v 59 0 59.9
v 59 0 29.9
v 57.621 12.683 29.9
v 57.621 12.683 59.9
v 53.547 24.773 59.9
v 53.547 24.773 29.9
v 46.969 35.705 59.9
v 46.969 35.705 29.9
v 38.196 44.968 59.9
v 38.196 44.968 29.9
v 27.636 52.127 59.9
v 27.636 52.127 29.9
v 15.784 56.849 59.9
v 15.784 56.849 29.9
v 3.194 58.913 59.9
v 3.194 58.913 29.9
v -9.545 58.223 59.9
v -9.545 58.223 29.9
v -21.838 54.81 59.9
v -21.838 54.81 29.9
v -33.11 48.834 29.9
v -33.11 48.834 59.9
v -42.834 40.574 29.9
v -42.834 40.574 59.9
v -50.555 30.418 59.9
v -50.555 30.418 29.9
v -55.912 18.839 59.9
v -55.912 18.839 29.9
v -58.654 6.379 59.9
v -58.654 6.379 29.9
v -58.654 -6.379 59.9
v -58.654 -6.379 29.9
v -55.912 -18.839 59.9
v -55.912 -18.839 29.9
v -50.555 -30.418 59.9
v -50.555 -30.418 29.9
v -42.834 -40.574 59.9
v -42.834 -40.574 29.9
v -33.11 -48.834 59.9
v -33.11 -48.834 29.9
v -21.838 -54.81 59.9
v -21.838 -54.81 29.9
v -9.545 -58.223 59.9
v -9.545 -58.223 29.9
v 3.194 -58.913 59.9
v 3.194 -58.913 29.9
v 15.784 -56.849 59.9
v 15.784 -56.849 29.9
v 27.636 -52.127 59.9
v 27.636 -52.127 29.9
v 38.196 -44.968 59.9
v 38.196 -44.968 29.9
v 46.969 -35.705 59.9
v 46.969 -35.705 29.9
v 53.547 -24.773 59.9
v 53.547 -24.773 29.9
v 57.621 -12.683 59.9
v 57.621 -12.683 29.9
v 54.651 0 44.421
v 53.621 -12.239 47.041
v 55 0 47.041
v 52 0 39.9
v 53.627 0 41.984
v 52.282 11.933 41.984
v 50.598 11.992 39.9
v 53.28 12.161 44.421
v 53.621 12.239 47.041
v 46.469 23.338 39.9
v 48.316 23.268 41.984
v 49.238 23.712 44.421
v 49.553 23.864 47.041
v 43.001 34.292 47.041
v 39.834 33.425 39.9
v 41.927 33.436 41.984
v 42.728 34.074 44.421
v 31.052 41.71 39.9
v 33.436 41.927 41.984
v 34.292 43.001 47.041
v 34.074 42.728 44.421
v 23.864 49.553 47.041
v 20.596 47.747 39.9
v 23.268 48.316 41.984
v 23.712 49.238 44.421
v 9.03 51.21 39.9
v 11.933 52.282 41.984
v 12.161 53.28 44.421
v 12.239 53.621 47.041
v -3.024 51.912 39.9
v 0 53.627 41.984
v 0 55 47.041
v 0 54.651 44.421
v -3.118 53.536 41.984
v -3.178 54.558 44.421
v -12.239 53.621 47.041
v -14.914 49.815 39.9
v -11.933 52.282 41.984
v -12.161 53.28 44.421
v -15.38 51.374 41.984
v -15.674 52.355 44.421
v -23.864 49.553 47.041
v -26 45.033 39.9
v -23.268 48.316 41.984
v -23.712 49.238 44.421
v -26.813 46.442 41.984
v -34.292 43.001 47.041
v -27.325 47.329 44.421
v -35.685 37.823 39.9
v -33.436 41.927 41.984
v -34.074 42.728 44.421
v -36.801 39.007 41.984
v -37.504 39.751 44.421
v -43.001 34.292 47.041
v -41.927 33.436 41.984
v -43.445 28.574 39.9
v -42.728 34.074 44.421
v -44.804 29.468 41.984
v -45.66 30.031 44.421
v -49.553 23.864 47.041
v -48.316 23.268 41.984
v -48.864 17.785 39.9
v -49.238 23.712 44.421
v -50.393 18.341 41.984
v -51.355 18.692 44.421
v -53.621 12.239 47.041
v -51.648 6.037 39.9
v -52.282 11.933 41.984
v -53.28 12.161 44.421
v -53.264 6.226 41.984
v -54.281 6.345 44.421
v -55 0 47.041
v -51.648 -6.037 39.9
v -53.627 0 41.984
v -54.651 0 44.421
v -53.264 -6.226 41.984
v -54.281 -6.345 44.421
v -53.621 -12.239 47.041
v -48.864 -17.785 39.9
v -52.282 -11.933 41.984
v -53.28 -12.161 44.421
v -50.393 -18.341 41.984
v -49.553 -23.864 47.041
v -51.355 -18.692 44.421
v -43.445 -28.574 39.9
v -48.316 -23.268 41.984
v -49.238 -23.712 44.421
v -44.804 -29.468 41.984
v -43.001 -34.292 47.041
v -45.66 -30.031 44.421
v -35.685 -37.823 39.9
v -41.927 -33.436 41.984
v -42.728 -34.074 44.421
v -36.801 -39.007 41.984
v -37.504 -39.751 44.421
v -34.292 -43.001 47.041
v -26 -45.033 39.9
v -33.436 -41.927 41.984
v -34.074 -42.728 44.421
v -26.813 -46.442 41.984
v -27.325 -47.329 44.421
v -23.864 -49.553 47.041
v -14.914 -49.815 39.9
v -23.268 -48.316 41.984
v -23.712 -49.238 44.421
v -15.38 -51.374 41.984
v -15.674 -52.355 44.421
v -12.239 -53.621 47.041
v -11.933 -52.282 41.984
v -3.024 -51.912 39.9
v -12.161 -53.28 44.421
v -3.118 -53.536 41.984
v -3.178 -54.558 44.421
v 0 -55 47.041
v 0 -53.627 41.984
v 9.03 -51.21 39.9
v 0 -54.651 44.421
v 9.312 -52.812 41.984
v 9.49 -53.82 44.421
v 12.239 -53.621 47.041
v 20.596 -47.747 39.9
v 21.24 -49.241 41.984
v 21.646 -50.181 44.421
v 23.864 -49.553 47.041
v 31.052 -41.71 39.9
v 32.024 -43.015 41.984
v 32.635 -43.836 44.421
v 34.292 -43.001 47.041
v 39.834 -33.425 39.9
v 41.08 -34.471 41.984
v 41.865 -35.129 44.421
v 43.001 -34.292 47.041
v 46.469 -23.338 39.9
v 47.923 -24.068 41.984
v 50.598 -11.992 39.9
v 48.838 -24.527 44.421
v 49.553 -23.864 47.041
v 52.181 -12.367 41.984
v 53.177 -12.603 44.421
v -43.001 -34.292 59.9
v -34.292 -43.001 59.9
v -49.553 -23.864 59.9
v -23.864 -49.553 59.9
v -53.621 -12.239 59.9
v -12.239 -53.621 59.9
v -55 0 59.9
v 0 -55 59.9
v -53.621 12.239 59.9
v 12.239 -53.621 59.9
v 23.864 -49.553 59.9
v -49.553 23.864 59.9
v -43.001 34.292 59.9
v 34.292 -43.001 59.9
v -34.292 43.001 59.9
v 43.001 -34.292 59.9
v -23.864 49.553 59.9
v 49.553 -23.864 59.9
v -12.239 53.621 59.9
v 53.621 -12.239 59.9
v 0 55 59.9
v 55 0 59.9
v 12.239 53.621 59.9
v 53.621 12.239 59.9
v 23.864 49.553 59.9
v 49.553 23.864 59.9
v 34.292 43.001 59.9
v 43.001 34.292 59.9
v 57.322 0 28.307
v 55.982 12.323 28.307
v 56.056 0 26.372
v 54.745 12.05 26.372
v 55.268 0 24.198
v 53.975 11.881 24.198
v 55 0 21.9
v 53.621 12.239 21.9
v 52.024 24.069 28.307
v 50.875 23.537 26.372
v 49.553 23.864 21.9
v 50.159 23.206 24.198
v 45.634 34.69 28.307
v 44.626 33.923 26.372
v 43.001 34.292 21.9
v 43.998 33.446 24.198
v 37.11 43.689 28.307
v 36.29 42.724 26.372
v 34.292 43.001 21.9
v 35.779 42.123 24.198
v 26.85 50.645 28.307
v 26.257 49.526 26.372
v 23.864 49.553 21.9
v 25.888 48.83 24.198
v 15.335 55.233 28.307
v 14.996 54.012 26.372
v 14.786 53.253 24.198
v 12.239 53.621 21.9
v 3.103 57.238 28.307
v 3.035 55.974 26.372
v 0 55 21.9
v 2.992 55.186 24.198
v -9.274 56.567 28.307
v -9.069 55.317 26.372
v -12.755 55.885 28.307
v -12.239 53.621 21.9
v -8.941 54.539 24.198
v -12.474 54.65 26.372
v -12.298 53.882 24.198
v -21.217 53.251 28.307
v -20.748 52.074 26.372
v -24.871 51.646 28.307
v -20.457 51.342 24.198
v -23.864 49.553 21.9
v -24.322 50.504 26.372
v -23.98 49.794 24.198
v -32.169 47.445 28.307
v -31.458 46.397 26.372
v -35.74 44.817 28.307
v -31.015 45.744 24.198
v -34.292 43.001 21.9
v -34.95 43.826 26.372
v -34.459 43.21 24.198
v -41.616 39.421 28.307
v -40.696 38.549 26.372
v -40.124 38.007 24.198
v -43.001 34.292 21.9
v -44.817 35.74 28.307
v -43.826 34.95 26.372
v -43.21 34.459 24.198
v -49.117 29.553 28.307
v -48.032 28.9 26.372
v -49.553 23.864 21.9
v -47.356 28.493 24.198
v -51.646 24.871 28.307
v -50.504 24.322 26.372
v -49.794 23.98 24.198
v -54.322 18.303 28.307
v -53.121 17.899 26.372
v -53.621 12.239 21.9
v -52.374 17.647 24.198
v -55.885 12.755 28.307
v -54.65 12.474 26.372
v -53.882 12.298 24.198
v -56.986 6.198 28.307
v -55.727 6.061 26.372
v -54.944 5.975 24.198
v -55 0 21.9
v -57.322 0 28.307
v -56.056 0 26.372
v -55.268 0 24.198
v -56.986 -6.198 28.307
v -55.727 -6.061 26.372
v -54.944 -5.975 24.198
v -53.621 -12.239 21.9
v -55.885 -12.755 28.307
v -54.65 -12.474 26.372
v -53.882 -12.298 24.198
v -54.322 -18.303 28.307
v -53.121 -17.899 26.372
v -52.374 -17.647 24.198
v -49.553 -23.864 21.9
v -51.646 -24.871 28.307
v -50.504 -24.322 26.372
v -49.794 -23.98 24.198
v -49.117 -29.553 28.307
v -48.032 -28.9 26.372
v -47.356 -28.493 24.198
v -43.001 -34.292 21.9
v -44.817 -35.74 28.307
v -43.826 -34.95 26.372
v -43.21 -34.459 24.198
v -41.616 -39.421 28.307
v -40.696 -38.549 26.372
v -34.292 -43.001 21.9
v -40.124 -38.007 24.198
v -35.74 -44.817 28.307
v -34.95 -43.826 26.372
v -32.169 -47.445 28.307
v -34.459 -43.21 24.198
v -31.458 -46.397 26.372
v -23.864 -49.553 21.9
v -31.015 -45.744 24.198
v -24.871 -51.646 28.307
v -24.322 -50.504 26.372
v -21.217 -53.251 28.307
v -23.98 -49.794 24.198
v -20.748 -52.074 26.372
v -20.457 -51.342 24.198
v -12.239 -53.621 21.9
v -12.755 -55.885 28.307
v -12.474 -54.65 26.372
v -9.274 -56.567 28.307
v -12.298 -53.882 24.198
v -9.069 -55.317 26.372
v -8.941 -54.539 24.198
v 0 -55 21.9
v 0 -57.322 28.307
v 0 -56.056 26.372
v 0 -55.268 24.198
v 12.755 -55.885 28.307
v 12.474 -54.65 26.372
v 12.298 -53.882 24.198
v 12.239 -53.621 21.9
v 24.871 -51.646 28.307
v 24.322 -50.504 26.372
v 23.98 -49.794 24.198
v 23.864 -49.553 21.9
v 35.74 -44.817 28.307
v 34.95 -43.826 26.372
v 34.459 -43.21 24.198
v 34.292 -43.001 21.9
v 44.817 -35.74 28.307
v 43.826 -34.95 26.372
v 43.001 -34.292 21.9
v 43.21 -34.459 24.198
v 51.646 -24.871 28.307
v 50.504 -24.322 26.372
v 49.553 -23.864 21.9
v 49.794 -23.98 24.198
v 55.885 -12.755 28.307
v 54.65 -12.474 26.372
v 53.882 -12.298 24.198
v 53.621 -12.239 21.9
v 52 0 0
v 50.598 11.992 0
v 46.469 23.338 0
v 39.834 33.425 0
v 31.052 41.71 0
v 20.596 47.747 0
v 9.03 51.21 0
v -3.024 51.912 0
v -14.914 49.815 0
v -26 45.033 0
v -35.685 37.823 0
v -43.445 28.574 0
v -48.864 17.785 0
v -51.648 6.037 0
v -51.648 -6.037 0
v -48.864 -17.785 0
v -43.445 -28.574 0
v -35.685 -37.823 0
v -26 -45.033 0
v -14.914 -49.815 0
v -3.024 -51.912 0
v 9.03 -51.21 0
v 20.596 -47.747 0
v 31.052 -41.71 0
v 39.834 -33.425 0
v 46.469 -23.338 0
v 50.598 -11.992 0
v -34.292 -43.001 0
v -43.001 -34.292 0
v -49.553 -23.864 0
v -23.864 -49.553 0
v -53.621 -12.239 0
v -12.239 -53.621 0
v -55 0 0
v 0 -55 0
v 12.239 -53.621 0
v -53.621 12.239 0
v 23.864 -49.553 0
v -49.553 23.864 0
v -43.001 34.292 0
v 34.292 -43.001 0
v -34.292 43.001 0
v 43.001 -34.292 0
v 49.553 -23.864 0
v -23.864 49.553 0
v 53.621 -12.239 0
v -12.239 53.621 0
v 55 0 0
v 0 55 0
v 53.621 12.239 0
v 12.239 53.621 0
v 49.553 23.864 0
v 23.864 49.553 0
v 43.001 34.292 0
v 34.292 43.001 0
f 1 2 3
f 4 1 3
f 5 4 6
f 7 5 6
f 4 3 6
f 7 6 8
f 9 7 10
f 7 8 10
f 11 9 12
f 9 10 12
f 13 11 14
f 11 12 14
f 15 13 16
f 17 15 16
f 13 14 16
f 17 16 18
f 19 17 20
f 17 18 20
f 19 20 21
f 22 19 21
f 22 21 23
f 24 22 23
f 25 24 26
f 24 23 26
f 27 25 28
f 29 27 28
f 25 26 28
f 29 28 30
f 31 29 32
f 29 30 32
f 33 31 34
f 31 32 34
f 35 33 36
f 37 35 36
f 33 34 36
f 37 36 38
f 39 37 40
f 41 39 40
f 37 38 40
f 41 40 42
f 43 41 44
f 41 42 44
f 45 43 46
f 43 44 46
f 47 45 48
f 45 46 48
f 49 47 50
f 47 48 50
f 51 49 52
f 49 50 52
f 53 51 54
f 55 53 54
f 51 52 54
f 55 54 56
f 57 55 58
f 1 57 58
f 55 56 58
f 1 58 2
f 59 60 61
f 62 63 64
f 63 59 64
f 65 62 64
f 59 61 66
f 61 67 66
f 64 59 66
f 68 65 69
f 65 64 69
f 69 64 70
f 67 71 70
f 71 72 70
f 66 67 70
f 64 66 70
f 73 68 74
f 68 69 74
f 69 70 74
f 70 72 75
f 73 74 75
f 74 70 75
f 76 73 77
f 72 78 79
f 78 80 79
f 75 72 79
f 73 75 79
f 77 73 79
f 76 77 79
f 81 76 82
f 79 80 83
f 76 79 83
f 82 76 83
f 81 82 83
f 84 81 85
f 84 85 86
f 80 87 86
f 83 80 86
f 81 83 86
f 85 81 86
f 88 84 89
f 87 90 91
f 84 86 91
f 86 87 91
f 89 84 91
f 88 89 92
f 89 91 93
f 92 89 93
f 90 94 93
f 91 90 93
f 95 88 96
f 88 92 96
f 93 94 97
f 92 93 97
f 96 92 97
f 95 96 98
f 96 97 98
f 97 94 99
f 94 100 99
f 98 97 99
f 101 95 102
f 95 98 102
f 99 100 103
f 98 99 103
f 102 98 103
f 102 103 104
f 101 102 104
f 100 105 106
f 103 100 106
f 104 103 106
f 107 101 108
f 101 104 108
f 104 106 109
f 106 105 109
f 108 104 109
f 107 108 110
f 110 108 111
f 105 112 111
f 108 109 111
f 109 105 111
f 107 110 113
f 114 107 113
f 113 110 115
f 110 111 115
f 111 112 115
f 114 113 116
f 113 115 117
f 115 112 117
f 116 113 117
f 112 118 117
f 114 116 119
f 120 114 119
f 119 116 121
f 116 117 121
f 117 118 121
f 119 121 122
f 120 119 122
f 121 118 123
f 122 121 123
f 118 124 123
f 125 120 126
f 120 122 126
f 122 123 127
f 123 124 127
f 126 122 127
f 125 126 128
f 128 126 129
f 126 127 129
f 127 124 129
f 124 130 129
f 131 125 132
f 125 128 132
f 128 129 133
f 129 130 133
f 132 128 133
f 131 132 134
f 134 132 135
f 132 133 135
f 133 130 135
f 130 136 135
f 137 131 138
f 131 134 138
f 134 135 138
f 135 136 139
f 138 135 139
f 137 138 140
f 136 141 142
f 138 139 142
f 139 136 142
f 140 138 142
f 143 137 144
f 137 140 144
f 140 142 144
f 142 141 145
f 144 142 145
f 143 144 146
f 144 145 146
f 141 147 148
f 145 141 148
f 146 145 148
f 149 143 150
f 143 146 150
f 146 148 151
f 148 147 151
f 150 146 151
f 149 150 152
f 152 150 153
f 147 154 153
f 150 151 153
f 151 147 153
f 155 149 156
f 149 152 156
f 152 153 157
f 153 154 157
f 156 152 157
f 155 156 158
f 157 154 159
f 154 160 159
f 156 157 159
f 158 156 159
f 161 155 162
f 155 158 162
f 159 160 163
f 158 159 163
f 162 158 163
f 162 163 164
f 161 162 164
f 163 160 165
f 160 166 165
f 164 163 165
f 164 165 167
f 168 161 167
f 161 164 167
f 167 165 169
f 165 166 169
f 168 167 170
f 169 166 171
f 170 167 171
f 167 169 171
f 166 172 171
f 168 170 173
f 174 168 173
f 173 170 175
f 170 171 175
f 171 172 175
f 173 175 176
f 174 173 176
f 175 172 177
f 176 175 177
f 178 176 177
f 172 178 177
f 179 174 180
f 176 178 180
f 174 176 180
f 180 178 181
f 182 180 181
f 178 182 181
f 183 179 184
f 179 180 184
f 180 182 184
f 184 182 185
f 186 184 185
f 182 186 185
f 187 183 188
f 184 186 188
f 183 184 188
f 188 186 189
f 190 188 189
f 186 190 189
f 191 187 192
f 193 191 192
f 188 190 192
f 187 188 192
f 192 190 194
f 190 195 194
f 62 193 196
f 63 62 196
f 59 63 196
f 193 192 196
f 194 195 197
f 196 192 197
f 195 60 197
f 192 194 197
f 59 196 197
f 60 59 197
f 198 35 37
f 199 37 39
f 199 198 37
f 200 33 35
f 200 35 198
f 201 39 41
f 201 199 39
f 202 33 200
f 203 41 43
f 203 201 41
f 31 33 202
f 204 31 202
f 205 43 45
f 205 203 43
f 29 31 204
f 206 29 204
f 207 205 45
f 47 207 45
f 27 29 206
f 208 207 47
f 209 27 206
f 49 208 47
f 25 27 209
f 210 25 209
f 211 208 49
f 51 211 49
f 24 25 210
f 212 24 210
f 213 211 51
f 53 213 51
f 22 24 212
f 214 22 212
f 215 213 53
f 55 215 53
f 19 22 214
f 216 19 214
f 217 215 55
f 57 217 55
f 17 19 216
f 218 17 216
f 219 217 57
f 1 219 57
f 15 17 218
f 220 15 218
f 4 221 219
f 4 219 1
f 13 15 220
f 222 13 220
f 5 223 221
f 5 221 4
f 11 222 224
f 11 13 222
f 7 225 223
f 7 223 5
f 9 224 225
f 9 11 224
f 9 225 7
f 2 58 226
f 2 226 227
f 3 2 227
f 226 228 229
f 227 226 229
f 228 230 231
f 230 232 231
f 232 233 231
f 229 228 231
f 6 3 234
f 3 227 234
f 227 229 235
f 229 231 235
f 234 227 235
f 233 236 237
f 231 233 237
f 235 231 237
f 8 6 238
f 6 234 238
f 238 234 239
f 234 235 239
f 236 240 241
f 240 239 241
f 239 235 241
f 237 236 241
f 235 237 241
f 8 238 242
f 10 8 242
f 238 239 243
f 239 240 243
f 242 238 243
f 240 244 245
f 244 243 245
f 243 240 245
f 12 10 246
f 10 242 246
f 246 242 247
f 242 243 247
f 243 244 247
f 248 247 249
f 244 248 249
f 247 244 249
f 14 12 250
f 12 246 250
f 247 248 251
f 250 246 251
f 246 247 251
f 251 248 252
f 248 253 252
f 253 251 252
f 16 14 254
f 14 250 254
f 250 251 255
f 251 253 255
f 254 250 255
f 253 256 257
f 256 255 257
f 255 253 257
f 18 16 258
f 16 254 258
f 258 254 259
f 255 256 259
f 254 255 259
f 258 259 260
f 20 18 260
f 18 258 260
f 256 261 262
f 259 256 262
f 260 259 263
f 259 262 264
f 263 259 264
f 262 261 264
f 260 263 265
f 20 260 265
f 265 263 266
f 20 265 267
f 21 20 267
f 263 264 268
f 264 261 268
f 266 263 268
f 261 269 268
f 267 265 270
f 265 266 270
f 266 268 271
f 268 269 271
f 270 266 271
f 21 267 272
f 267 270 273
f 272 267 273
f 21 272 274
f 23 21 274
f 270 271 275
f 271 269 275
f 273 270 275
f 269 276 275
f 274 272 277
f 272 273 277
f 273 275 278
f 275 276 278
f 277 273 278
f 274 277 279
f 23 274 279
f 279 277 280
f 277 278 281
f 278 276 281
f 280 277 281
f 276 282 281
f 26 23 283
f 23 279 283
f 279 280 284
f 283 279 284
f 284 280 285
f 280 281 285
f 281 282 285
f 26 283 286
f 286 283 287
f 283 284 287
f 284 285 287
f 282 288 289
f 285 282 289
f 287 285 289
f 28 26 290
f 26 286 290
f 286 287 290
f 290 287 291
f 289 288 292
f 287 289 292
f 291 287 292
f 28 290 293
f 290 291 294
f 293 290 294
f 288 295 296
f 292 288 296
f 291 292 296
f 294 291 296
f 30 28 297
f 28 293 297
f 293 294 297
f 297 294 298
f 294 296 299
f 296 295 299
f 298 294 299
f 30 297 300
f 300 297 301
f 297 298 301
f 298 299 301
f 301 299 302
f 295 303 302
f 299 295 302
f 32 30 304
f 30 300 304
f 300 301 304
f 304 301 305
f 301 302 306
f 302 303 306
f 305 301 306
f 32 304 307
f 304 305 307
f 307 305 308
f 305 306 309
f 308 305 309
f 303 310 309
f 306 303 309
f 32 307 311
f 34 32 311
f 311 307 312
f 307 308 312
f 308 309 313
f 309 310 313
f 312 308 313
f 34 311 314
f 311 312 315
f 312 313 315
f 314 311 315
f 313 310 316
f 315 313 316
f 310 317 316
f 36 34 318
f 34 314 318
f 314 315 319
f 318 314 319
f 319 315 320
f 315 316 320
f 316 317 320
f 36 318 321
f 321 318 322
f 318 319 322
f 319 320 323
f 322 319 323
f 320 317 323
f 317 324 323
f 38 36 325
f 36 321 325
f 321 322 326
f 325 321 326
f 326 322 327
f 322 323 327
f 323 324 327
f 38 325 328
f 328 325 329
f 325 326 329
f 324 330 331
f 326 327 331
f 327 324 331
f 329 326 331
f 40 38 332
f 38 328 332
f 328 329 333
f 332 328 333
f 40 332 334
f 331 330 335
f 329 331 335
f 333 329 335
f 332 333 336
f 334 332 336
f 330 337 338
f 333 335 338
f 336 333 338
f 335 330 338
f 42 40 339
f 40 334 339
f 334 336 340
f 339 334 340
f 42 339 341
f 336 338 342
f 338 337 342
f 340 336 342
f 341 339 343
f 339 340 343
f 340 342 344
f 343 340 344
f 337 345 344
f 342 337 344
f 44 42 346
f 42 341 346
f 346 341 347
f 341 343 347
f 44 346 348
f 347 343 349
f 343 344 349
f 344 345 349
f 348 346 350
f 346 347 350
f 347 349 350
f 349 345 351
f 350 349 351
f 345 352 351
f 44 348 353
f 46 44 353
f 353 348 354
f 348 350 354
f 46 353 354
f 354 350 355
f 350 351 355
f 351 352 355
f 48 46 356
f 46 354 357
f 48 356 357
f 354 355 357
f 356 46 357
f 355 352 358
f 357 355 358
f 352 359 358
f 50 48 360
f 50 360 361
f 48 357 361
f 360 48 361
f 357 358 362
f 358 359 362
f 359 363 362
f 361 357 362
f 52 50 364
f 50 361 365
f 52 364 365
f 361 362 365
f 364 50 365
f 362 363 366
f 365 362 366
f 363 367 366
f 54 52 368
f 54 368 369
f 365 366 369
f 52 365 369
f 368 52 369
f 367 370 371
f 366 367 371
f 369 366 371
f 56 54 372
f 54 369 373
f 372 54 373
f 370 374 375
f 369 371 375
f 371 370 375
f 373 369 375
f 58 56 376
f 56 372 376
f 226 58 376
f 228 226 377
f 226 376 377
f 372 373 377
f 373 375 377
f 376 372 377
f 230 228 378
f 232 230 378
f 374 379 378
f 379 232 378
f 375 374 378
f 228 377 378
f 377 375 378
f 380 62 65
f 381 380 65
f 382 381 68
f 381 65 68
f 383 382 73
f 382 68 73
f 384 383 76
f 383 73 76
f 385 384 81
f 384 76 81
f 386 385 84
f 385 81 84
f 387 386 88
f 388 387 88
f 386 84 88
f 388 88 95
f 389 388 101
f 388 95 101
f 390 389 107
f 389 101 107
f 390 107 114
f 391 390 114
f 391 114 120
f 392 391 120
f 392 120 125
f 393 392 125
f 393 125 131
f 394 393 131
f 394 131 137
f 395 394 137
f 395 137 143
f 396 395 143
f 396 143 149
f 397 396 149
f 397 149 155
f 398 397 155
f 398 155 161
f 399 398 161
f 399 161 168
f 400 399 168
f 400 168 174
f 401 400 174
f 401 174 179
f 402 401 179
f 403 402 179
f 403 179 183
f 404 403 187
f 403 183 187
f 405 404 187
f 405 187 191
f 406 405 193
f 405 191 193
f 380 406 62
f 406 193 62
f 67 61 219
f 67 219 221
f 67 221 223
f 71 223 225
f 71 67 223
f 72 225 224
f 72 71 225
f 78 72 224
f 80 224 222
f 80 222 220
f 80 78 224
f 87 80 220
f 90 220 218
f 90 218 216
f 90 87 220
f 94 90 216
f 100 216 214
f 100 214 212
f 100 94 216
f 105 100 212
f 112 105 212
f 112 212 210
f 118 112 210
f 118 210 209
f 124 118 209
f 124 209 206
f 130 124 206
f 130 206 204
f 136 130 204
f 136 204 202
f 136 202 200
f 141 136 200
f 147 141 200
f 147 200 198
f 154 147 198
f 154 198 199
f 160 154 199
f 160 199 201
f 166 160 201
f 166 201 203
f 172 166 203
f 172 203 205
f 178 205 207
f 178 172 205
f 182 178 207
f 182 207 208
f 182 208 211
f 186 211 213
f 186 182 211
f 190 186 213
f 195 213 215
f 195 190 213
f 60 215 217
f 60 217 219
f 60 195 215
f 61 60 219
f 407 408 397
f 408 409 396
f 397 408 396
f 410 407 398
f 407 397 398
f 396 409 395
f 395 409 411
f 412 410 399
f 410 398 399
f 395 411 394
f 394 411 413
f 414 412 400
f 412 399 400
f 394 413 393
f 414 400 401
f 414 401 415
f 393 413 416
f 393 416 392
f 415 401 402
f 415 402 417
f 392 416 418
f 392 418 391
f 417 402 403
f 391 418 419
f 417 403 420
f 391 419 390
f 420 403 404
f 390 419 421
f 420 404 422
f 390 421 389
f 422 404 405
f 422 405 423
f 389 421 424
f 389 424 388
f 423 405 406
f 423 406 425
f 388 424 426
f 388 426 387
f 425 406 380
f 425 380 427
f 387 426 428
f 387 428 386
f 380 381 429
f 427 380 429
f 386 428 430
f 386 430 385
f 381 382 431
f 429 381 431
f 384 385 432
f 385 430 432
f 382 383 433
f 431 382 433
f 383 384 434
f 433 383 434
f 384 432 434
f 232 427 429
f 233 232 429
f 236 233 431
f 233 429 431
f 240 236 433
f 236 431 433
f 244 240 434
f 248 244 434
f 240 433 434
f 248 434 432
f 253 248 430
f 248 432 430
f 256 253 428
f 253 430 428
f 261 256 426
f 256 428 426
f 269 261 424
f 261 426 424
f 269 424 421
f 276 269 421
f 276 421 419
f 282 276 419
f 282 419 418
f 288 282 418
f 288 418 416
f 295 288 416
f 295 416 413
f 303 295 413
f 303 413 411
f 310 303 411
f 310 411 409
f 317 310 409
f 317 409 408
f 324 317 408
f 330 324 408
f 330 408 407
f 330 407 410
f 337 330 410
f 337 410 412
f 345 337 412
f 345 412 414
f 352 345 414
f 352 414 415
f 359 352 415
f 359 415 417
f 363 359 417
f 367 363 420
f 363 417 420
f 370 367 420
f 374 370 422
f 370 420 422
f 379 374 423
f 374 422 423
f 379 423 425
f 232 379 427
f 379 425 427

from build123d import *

# Parameters (mm, degrees)
SKETCH1_R              = 55
SKETCH1_R_2            = 3
BOSS_EXTRUDE1_DEPTH    = 39.9
SKETCH2_R              = 52
CUT_EXTRUDE1_DEPTH     = 60
CUT_EXTRUDE2_START     = -39.9
CUT_EXTRUDE2_OUTLINE_R = 3
CUT_EXTRUDE2_DEPTH     = 39.9
EXTRUDE_THIN1_START    = -10
SKETCH4_R              = 59
SKETCH4_R_2            = 55
EXTRUDE_THIN1_DEPTH    = 30
FILLET1_R              = 10
FILLET2_R              = 10


# Read off the part's stored shape, not the designer's step: Cut-Extrude2
with BuildPart() as part:
    # Sketch1 → Boss-Extrude1 (new body)
    with BuildSketch(Plane.XY):
        Circle(SKETCH1_R)
        Circle(SKETCH1_R_2, mode=Mode.SUBTRACT)
    extrude(amount=BOSS_EXTRUDE1_DEPTH)

    # Sketch2 → Cut-Extrude1 (cut)
    with BuildSketch(Plane.XY.offset(39.9)):
        Circle(SKETCH2_R)
        with BuildLine():
            Line((-41.361950208, 16.620711788), (-41.361950208, -16.620711788))
            ThreePointArc((-41.361950208, -16.620711788), (0, -44.576439802), (41.361950208, -16.620711788))
            Line((41.361950208, -16.620711788), (41.361950208, 16.620711788))
            ThreePointArc((41.361950208, 16.620711788), (0, 44.576439802), (-41.361950208, 16.620711788))
        make_face(mode=Mode.SUBTRACT)
    extrude(amount=-CUT_EXTRUDE1_DEPTH, mode=Mode.SUBTRACT)


with BuildPart() as cut_extrude1_piece_1:
    # of the separate pieces the step leaves, piece 1, a body of its own (cut_extrude1_pieces)
    add(part.part.solids().sort_by_distance((41.361950208, -16.620711788, 0))[0])

    # Cut-Extrude2 outline → Cut-Extrude2 (cut)
    with BuildSketch(Plane.XY.offset(39.9).offset(CUT_EXTRUDE2_START)):
        with BuildLine():
            Line((41.361950208, -16.620711788), (41.361950208, 16.620711788))
            ThreePointArc((41.361950208, 16.620711788), (0, 44.576439802), (-41.361950208, 16.620711788))
            Line((-41.361950208, 16.620711788), (-41.361950208, -16.620711788))
            ThreePointArc((-41.361950208, -16.620711788), (0, -44.576439802), (41.361950208, -16.620711788))
        make_face()
        Circle(CUT_EXTRUDE2_OUTLINE_R, mode=Mode.SUBTRACT)
    extrude(amount=CUT_EXTRUDE2_DEPTH, mode=Mode.SUBTRACT)


with BuildPart() as cut_extrude1_piece_2:
    # of the separate pieces the step leaves, piece 2, a body of its own (cut_extrude1_pieces)
    add(part.part.solids().sort_by_distance((55, 0, 0))[0])

    # Sketch4 → Extrude-Thin1 (add)
    with BuildSketch(Plane.XY.offset(39.9).offset(EXTRUDE_THIN1_START)):
        Circle(SKETCH4_R)
        Circle(SKETCH4_R_2, mode=Mode.SUBTRACT)
    extrude(amount=EXTRUDE_THIN1_DEPTH)

    # Fillet1
    # the kernel refuses this fillet: 10 mm, written as the material it adds along each edge
    with BuildSketch(Plane(origin=(0, 0, 29.9), x_dir=(1, 0, 0), z_dir=(0, -1, 0))) as fillet1_piece_1:
        with BuildLine():
            CenterArc((65, -8), FILLET1_R, 126.869897646, 53.130102354)
            Line((59, 0), (58.88, 0.16))
            ThreePointArc((58.88, 0.16), (57, 0.2), (55, 0.2))
            Line((55, 0.2), (54.8, 0))
            Line((54.8, 0), (54.8, -8))
            Line((54.8, -8), (55, -8))
        make_face()
    revolve(axis=Axis((0, 0, 29.9), (0, 0, 1)))

    # Fillet2
    # the kernel refuses this fillet: 10 mm, written as the material it adds along each edge
    with BuildSketch(Plane(origin=(0, 0, 39.9), x_dir=(1, 0, 0), z_dir=(0, -1, 0))) as fillet2_piece_1:
        with BuildLine():
            CenterArc((45, 7.141428429), FILLET2_R, 314.427004001, 45.572995999)
            Line((52, 0), (52.14, -0.142828569))
            ThreePointArc((52.14, -0.142828569), (53.5, -0.2), (55, -0.2))
            Line((55, -0.2), (55.2, 0))
            Line((55.2, 0), (55.2, 7.141428429))
            Line((55.2, 7.141428429), (55, 7.141428429))
        make_face()
    revolve(axis=Axis((0, 0, 39.9), (0, 0, 1)))


solid = cut_extrude1_piece_2.part
